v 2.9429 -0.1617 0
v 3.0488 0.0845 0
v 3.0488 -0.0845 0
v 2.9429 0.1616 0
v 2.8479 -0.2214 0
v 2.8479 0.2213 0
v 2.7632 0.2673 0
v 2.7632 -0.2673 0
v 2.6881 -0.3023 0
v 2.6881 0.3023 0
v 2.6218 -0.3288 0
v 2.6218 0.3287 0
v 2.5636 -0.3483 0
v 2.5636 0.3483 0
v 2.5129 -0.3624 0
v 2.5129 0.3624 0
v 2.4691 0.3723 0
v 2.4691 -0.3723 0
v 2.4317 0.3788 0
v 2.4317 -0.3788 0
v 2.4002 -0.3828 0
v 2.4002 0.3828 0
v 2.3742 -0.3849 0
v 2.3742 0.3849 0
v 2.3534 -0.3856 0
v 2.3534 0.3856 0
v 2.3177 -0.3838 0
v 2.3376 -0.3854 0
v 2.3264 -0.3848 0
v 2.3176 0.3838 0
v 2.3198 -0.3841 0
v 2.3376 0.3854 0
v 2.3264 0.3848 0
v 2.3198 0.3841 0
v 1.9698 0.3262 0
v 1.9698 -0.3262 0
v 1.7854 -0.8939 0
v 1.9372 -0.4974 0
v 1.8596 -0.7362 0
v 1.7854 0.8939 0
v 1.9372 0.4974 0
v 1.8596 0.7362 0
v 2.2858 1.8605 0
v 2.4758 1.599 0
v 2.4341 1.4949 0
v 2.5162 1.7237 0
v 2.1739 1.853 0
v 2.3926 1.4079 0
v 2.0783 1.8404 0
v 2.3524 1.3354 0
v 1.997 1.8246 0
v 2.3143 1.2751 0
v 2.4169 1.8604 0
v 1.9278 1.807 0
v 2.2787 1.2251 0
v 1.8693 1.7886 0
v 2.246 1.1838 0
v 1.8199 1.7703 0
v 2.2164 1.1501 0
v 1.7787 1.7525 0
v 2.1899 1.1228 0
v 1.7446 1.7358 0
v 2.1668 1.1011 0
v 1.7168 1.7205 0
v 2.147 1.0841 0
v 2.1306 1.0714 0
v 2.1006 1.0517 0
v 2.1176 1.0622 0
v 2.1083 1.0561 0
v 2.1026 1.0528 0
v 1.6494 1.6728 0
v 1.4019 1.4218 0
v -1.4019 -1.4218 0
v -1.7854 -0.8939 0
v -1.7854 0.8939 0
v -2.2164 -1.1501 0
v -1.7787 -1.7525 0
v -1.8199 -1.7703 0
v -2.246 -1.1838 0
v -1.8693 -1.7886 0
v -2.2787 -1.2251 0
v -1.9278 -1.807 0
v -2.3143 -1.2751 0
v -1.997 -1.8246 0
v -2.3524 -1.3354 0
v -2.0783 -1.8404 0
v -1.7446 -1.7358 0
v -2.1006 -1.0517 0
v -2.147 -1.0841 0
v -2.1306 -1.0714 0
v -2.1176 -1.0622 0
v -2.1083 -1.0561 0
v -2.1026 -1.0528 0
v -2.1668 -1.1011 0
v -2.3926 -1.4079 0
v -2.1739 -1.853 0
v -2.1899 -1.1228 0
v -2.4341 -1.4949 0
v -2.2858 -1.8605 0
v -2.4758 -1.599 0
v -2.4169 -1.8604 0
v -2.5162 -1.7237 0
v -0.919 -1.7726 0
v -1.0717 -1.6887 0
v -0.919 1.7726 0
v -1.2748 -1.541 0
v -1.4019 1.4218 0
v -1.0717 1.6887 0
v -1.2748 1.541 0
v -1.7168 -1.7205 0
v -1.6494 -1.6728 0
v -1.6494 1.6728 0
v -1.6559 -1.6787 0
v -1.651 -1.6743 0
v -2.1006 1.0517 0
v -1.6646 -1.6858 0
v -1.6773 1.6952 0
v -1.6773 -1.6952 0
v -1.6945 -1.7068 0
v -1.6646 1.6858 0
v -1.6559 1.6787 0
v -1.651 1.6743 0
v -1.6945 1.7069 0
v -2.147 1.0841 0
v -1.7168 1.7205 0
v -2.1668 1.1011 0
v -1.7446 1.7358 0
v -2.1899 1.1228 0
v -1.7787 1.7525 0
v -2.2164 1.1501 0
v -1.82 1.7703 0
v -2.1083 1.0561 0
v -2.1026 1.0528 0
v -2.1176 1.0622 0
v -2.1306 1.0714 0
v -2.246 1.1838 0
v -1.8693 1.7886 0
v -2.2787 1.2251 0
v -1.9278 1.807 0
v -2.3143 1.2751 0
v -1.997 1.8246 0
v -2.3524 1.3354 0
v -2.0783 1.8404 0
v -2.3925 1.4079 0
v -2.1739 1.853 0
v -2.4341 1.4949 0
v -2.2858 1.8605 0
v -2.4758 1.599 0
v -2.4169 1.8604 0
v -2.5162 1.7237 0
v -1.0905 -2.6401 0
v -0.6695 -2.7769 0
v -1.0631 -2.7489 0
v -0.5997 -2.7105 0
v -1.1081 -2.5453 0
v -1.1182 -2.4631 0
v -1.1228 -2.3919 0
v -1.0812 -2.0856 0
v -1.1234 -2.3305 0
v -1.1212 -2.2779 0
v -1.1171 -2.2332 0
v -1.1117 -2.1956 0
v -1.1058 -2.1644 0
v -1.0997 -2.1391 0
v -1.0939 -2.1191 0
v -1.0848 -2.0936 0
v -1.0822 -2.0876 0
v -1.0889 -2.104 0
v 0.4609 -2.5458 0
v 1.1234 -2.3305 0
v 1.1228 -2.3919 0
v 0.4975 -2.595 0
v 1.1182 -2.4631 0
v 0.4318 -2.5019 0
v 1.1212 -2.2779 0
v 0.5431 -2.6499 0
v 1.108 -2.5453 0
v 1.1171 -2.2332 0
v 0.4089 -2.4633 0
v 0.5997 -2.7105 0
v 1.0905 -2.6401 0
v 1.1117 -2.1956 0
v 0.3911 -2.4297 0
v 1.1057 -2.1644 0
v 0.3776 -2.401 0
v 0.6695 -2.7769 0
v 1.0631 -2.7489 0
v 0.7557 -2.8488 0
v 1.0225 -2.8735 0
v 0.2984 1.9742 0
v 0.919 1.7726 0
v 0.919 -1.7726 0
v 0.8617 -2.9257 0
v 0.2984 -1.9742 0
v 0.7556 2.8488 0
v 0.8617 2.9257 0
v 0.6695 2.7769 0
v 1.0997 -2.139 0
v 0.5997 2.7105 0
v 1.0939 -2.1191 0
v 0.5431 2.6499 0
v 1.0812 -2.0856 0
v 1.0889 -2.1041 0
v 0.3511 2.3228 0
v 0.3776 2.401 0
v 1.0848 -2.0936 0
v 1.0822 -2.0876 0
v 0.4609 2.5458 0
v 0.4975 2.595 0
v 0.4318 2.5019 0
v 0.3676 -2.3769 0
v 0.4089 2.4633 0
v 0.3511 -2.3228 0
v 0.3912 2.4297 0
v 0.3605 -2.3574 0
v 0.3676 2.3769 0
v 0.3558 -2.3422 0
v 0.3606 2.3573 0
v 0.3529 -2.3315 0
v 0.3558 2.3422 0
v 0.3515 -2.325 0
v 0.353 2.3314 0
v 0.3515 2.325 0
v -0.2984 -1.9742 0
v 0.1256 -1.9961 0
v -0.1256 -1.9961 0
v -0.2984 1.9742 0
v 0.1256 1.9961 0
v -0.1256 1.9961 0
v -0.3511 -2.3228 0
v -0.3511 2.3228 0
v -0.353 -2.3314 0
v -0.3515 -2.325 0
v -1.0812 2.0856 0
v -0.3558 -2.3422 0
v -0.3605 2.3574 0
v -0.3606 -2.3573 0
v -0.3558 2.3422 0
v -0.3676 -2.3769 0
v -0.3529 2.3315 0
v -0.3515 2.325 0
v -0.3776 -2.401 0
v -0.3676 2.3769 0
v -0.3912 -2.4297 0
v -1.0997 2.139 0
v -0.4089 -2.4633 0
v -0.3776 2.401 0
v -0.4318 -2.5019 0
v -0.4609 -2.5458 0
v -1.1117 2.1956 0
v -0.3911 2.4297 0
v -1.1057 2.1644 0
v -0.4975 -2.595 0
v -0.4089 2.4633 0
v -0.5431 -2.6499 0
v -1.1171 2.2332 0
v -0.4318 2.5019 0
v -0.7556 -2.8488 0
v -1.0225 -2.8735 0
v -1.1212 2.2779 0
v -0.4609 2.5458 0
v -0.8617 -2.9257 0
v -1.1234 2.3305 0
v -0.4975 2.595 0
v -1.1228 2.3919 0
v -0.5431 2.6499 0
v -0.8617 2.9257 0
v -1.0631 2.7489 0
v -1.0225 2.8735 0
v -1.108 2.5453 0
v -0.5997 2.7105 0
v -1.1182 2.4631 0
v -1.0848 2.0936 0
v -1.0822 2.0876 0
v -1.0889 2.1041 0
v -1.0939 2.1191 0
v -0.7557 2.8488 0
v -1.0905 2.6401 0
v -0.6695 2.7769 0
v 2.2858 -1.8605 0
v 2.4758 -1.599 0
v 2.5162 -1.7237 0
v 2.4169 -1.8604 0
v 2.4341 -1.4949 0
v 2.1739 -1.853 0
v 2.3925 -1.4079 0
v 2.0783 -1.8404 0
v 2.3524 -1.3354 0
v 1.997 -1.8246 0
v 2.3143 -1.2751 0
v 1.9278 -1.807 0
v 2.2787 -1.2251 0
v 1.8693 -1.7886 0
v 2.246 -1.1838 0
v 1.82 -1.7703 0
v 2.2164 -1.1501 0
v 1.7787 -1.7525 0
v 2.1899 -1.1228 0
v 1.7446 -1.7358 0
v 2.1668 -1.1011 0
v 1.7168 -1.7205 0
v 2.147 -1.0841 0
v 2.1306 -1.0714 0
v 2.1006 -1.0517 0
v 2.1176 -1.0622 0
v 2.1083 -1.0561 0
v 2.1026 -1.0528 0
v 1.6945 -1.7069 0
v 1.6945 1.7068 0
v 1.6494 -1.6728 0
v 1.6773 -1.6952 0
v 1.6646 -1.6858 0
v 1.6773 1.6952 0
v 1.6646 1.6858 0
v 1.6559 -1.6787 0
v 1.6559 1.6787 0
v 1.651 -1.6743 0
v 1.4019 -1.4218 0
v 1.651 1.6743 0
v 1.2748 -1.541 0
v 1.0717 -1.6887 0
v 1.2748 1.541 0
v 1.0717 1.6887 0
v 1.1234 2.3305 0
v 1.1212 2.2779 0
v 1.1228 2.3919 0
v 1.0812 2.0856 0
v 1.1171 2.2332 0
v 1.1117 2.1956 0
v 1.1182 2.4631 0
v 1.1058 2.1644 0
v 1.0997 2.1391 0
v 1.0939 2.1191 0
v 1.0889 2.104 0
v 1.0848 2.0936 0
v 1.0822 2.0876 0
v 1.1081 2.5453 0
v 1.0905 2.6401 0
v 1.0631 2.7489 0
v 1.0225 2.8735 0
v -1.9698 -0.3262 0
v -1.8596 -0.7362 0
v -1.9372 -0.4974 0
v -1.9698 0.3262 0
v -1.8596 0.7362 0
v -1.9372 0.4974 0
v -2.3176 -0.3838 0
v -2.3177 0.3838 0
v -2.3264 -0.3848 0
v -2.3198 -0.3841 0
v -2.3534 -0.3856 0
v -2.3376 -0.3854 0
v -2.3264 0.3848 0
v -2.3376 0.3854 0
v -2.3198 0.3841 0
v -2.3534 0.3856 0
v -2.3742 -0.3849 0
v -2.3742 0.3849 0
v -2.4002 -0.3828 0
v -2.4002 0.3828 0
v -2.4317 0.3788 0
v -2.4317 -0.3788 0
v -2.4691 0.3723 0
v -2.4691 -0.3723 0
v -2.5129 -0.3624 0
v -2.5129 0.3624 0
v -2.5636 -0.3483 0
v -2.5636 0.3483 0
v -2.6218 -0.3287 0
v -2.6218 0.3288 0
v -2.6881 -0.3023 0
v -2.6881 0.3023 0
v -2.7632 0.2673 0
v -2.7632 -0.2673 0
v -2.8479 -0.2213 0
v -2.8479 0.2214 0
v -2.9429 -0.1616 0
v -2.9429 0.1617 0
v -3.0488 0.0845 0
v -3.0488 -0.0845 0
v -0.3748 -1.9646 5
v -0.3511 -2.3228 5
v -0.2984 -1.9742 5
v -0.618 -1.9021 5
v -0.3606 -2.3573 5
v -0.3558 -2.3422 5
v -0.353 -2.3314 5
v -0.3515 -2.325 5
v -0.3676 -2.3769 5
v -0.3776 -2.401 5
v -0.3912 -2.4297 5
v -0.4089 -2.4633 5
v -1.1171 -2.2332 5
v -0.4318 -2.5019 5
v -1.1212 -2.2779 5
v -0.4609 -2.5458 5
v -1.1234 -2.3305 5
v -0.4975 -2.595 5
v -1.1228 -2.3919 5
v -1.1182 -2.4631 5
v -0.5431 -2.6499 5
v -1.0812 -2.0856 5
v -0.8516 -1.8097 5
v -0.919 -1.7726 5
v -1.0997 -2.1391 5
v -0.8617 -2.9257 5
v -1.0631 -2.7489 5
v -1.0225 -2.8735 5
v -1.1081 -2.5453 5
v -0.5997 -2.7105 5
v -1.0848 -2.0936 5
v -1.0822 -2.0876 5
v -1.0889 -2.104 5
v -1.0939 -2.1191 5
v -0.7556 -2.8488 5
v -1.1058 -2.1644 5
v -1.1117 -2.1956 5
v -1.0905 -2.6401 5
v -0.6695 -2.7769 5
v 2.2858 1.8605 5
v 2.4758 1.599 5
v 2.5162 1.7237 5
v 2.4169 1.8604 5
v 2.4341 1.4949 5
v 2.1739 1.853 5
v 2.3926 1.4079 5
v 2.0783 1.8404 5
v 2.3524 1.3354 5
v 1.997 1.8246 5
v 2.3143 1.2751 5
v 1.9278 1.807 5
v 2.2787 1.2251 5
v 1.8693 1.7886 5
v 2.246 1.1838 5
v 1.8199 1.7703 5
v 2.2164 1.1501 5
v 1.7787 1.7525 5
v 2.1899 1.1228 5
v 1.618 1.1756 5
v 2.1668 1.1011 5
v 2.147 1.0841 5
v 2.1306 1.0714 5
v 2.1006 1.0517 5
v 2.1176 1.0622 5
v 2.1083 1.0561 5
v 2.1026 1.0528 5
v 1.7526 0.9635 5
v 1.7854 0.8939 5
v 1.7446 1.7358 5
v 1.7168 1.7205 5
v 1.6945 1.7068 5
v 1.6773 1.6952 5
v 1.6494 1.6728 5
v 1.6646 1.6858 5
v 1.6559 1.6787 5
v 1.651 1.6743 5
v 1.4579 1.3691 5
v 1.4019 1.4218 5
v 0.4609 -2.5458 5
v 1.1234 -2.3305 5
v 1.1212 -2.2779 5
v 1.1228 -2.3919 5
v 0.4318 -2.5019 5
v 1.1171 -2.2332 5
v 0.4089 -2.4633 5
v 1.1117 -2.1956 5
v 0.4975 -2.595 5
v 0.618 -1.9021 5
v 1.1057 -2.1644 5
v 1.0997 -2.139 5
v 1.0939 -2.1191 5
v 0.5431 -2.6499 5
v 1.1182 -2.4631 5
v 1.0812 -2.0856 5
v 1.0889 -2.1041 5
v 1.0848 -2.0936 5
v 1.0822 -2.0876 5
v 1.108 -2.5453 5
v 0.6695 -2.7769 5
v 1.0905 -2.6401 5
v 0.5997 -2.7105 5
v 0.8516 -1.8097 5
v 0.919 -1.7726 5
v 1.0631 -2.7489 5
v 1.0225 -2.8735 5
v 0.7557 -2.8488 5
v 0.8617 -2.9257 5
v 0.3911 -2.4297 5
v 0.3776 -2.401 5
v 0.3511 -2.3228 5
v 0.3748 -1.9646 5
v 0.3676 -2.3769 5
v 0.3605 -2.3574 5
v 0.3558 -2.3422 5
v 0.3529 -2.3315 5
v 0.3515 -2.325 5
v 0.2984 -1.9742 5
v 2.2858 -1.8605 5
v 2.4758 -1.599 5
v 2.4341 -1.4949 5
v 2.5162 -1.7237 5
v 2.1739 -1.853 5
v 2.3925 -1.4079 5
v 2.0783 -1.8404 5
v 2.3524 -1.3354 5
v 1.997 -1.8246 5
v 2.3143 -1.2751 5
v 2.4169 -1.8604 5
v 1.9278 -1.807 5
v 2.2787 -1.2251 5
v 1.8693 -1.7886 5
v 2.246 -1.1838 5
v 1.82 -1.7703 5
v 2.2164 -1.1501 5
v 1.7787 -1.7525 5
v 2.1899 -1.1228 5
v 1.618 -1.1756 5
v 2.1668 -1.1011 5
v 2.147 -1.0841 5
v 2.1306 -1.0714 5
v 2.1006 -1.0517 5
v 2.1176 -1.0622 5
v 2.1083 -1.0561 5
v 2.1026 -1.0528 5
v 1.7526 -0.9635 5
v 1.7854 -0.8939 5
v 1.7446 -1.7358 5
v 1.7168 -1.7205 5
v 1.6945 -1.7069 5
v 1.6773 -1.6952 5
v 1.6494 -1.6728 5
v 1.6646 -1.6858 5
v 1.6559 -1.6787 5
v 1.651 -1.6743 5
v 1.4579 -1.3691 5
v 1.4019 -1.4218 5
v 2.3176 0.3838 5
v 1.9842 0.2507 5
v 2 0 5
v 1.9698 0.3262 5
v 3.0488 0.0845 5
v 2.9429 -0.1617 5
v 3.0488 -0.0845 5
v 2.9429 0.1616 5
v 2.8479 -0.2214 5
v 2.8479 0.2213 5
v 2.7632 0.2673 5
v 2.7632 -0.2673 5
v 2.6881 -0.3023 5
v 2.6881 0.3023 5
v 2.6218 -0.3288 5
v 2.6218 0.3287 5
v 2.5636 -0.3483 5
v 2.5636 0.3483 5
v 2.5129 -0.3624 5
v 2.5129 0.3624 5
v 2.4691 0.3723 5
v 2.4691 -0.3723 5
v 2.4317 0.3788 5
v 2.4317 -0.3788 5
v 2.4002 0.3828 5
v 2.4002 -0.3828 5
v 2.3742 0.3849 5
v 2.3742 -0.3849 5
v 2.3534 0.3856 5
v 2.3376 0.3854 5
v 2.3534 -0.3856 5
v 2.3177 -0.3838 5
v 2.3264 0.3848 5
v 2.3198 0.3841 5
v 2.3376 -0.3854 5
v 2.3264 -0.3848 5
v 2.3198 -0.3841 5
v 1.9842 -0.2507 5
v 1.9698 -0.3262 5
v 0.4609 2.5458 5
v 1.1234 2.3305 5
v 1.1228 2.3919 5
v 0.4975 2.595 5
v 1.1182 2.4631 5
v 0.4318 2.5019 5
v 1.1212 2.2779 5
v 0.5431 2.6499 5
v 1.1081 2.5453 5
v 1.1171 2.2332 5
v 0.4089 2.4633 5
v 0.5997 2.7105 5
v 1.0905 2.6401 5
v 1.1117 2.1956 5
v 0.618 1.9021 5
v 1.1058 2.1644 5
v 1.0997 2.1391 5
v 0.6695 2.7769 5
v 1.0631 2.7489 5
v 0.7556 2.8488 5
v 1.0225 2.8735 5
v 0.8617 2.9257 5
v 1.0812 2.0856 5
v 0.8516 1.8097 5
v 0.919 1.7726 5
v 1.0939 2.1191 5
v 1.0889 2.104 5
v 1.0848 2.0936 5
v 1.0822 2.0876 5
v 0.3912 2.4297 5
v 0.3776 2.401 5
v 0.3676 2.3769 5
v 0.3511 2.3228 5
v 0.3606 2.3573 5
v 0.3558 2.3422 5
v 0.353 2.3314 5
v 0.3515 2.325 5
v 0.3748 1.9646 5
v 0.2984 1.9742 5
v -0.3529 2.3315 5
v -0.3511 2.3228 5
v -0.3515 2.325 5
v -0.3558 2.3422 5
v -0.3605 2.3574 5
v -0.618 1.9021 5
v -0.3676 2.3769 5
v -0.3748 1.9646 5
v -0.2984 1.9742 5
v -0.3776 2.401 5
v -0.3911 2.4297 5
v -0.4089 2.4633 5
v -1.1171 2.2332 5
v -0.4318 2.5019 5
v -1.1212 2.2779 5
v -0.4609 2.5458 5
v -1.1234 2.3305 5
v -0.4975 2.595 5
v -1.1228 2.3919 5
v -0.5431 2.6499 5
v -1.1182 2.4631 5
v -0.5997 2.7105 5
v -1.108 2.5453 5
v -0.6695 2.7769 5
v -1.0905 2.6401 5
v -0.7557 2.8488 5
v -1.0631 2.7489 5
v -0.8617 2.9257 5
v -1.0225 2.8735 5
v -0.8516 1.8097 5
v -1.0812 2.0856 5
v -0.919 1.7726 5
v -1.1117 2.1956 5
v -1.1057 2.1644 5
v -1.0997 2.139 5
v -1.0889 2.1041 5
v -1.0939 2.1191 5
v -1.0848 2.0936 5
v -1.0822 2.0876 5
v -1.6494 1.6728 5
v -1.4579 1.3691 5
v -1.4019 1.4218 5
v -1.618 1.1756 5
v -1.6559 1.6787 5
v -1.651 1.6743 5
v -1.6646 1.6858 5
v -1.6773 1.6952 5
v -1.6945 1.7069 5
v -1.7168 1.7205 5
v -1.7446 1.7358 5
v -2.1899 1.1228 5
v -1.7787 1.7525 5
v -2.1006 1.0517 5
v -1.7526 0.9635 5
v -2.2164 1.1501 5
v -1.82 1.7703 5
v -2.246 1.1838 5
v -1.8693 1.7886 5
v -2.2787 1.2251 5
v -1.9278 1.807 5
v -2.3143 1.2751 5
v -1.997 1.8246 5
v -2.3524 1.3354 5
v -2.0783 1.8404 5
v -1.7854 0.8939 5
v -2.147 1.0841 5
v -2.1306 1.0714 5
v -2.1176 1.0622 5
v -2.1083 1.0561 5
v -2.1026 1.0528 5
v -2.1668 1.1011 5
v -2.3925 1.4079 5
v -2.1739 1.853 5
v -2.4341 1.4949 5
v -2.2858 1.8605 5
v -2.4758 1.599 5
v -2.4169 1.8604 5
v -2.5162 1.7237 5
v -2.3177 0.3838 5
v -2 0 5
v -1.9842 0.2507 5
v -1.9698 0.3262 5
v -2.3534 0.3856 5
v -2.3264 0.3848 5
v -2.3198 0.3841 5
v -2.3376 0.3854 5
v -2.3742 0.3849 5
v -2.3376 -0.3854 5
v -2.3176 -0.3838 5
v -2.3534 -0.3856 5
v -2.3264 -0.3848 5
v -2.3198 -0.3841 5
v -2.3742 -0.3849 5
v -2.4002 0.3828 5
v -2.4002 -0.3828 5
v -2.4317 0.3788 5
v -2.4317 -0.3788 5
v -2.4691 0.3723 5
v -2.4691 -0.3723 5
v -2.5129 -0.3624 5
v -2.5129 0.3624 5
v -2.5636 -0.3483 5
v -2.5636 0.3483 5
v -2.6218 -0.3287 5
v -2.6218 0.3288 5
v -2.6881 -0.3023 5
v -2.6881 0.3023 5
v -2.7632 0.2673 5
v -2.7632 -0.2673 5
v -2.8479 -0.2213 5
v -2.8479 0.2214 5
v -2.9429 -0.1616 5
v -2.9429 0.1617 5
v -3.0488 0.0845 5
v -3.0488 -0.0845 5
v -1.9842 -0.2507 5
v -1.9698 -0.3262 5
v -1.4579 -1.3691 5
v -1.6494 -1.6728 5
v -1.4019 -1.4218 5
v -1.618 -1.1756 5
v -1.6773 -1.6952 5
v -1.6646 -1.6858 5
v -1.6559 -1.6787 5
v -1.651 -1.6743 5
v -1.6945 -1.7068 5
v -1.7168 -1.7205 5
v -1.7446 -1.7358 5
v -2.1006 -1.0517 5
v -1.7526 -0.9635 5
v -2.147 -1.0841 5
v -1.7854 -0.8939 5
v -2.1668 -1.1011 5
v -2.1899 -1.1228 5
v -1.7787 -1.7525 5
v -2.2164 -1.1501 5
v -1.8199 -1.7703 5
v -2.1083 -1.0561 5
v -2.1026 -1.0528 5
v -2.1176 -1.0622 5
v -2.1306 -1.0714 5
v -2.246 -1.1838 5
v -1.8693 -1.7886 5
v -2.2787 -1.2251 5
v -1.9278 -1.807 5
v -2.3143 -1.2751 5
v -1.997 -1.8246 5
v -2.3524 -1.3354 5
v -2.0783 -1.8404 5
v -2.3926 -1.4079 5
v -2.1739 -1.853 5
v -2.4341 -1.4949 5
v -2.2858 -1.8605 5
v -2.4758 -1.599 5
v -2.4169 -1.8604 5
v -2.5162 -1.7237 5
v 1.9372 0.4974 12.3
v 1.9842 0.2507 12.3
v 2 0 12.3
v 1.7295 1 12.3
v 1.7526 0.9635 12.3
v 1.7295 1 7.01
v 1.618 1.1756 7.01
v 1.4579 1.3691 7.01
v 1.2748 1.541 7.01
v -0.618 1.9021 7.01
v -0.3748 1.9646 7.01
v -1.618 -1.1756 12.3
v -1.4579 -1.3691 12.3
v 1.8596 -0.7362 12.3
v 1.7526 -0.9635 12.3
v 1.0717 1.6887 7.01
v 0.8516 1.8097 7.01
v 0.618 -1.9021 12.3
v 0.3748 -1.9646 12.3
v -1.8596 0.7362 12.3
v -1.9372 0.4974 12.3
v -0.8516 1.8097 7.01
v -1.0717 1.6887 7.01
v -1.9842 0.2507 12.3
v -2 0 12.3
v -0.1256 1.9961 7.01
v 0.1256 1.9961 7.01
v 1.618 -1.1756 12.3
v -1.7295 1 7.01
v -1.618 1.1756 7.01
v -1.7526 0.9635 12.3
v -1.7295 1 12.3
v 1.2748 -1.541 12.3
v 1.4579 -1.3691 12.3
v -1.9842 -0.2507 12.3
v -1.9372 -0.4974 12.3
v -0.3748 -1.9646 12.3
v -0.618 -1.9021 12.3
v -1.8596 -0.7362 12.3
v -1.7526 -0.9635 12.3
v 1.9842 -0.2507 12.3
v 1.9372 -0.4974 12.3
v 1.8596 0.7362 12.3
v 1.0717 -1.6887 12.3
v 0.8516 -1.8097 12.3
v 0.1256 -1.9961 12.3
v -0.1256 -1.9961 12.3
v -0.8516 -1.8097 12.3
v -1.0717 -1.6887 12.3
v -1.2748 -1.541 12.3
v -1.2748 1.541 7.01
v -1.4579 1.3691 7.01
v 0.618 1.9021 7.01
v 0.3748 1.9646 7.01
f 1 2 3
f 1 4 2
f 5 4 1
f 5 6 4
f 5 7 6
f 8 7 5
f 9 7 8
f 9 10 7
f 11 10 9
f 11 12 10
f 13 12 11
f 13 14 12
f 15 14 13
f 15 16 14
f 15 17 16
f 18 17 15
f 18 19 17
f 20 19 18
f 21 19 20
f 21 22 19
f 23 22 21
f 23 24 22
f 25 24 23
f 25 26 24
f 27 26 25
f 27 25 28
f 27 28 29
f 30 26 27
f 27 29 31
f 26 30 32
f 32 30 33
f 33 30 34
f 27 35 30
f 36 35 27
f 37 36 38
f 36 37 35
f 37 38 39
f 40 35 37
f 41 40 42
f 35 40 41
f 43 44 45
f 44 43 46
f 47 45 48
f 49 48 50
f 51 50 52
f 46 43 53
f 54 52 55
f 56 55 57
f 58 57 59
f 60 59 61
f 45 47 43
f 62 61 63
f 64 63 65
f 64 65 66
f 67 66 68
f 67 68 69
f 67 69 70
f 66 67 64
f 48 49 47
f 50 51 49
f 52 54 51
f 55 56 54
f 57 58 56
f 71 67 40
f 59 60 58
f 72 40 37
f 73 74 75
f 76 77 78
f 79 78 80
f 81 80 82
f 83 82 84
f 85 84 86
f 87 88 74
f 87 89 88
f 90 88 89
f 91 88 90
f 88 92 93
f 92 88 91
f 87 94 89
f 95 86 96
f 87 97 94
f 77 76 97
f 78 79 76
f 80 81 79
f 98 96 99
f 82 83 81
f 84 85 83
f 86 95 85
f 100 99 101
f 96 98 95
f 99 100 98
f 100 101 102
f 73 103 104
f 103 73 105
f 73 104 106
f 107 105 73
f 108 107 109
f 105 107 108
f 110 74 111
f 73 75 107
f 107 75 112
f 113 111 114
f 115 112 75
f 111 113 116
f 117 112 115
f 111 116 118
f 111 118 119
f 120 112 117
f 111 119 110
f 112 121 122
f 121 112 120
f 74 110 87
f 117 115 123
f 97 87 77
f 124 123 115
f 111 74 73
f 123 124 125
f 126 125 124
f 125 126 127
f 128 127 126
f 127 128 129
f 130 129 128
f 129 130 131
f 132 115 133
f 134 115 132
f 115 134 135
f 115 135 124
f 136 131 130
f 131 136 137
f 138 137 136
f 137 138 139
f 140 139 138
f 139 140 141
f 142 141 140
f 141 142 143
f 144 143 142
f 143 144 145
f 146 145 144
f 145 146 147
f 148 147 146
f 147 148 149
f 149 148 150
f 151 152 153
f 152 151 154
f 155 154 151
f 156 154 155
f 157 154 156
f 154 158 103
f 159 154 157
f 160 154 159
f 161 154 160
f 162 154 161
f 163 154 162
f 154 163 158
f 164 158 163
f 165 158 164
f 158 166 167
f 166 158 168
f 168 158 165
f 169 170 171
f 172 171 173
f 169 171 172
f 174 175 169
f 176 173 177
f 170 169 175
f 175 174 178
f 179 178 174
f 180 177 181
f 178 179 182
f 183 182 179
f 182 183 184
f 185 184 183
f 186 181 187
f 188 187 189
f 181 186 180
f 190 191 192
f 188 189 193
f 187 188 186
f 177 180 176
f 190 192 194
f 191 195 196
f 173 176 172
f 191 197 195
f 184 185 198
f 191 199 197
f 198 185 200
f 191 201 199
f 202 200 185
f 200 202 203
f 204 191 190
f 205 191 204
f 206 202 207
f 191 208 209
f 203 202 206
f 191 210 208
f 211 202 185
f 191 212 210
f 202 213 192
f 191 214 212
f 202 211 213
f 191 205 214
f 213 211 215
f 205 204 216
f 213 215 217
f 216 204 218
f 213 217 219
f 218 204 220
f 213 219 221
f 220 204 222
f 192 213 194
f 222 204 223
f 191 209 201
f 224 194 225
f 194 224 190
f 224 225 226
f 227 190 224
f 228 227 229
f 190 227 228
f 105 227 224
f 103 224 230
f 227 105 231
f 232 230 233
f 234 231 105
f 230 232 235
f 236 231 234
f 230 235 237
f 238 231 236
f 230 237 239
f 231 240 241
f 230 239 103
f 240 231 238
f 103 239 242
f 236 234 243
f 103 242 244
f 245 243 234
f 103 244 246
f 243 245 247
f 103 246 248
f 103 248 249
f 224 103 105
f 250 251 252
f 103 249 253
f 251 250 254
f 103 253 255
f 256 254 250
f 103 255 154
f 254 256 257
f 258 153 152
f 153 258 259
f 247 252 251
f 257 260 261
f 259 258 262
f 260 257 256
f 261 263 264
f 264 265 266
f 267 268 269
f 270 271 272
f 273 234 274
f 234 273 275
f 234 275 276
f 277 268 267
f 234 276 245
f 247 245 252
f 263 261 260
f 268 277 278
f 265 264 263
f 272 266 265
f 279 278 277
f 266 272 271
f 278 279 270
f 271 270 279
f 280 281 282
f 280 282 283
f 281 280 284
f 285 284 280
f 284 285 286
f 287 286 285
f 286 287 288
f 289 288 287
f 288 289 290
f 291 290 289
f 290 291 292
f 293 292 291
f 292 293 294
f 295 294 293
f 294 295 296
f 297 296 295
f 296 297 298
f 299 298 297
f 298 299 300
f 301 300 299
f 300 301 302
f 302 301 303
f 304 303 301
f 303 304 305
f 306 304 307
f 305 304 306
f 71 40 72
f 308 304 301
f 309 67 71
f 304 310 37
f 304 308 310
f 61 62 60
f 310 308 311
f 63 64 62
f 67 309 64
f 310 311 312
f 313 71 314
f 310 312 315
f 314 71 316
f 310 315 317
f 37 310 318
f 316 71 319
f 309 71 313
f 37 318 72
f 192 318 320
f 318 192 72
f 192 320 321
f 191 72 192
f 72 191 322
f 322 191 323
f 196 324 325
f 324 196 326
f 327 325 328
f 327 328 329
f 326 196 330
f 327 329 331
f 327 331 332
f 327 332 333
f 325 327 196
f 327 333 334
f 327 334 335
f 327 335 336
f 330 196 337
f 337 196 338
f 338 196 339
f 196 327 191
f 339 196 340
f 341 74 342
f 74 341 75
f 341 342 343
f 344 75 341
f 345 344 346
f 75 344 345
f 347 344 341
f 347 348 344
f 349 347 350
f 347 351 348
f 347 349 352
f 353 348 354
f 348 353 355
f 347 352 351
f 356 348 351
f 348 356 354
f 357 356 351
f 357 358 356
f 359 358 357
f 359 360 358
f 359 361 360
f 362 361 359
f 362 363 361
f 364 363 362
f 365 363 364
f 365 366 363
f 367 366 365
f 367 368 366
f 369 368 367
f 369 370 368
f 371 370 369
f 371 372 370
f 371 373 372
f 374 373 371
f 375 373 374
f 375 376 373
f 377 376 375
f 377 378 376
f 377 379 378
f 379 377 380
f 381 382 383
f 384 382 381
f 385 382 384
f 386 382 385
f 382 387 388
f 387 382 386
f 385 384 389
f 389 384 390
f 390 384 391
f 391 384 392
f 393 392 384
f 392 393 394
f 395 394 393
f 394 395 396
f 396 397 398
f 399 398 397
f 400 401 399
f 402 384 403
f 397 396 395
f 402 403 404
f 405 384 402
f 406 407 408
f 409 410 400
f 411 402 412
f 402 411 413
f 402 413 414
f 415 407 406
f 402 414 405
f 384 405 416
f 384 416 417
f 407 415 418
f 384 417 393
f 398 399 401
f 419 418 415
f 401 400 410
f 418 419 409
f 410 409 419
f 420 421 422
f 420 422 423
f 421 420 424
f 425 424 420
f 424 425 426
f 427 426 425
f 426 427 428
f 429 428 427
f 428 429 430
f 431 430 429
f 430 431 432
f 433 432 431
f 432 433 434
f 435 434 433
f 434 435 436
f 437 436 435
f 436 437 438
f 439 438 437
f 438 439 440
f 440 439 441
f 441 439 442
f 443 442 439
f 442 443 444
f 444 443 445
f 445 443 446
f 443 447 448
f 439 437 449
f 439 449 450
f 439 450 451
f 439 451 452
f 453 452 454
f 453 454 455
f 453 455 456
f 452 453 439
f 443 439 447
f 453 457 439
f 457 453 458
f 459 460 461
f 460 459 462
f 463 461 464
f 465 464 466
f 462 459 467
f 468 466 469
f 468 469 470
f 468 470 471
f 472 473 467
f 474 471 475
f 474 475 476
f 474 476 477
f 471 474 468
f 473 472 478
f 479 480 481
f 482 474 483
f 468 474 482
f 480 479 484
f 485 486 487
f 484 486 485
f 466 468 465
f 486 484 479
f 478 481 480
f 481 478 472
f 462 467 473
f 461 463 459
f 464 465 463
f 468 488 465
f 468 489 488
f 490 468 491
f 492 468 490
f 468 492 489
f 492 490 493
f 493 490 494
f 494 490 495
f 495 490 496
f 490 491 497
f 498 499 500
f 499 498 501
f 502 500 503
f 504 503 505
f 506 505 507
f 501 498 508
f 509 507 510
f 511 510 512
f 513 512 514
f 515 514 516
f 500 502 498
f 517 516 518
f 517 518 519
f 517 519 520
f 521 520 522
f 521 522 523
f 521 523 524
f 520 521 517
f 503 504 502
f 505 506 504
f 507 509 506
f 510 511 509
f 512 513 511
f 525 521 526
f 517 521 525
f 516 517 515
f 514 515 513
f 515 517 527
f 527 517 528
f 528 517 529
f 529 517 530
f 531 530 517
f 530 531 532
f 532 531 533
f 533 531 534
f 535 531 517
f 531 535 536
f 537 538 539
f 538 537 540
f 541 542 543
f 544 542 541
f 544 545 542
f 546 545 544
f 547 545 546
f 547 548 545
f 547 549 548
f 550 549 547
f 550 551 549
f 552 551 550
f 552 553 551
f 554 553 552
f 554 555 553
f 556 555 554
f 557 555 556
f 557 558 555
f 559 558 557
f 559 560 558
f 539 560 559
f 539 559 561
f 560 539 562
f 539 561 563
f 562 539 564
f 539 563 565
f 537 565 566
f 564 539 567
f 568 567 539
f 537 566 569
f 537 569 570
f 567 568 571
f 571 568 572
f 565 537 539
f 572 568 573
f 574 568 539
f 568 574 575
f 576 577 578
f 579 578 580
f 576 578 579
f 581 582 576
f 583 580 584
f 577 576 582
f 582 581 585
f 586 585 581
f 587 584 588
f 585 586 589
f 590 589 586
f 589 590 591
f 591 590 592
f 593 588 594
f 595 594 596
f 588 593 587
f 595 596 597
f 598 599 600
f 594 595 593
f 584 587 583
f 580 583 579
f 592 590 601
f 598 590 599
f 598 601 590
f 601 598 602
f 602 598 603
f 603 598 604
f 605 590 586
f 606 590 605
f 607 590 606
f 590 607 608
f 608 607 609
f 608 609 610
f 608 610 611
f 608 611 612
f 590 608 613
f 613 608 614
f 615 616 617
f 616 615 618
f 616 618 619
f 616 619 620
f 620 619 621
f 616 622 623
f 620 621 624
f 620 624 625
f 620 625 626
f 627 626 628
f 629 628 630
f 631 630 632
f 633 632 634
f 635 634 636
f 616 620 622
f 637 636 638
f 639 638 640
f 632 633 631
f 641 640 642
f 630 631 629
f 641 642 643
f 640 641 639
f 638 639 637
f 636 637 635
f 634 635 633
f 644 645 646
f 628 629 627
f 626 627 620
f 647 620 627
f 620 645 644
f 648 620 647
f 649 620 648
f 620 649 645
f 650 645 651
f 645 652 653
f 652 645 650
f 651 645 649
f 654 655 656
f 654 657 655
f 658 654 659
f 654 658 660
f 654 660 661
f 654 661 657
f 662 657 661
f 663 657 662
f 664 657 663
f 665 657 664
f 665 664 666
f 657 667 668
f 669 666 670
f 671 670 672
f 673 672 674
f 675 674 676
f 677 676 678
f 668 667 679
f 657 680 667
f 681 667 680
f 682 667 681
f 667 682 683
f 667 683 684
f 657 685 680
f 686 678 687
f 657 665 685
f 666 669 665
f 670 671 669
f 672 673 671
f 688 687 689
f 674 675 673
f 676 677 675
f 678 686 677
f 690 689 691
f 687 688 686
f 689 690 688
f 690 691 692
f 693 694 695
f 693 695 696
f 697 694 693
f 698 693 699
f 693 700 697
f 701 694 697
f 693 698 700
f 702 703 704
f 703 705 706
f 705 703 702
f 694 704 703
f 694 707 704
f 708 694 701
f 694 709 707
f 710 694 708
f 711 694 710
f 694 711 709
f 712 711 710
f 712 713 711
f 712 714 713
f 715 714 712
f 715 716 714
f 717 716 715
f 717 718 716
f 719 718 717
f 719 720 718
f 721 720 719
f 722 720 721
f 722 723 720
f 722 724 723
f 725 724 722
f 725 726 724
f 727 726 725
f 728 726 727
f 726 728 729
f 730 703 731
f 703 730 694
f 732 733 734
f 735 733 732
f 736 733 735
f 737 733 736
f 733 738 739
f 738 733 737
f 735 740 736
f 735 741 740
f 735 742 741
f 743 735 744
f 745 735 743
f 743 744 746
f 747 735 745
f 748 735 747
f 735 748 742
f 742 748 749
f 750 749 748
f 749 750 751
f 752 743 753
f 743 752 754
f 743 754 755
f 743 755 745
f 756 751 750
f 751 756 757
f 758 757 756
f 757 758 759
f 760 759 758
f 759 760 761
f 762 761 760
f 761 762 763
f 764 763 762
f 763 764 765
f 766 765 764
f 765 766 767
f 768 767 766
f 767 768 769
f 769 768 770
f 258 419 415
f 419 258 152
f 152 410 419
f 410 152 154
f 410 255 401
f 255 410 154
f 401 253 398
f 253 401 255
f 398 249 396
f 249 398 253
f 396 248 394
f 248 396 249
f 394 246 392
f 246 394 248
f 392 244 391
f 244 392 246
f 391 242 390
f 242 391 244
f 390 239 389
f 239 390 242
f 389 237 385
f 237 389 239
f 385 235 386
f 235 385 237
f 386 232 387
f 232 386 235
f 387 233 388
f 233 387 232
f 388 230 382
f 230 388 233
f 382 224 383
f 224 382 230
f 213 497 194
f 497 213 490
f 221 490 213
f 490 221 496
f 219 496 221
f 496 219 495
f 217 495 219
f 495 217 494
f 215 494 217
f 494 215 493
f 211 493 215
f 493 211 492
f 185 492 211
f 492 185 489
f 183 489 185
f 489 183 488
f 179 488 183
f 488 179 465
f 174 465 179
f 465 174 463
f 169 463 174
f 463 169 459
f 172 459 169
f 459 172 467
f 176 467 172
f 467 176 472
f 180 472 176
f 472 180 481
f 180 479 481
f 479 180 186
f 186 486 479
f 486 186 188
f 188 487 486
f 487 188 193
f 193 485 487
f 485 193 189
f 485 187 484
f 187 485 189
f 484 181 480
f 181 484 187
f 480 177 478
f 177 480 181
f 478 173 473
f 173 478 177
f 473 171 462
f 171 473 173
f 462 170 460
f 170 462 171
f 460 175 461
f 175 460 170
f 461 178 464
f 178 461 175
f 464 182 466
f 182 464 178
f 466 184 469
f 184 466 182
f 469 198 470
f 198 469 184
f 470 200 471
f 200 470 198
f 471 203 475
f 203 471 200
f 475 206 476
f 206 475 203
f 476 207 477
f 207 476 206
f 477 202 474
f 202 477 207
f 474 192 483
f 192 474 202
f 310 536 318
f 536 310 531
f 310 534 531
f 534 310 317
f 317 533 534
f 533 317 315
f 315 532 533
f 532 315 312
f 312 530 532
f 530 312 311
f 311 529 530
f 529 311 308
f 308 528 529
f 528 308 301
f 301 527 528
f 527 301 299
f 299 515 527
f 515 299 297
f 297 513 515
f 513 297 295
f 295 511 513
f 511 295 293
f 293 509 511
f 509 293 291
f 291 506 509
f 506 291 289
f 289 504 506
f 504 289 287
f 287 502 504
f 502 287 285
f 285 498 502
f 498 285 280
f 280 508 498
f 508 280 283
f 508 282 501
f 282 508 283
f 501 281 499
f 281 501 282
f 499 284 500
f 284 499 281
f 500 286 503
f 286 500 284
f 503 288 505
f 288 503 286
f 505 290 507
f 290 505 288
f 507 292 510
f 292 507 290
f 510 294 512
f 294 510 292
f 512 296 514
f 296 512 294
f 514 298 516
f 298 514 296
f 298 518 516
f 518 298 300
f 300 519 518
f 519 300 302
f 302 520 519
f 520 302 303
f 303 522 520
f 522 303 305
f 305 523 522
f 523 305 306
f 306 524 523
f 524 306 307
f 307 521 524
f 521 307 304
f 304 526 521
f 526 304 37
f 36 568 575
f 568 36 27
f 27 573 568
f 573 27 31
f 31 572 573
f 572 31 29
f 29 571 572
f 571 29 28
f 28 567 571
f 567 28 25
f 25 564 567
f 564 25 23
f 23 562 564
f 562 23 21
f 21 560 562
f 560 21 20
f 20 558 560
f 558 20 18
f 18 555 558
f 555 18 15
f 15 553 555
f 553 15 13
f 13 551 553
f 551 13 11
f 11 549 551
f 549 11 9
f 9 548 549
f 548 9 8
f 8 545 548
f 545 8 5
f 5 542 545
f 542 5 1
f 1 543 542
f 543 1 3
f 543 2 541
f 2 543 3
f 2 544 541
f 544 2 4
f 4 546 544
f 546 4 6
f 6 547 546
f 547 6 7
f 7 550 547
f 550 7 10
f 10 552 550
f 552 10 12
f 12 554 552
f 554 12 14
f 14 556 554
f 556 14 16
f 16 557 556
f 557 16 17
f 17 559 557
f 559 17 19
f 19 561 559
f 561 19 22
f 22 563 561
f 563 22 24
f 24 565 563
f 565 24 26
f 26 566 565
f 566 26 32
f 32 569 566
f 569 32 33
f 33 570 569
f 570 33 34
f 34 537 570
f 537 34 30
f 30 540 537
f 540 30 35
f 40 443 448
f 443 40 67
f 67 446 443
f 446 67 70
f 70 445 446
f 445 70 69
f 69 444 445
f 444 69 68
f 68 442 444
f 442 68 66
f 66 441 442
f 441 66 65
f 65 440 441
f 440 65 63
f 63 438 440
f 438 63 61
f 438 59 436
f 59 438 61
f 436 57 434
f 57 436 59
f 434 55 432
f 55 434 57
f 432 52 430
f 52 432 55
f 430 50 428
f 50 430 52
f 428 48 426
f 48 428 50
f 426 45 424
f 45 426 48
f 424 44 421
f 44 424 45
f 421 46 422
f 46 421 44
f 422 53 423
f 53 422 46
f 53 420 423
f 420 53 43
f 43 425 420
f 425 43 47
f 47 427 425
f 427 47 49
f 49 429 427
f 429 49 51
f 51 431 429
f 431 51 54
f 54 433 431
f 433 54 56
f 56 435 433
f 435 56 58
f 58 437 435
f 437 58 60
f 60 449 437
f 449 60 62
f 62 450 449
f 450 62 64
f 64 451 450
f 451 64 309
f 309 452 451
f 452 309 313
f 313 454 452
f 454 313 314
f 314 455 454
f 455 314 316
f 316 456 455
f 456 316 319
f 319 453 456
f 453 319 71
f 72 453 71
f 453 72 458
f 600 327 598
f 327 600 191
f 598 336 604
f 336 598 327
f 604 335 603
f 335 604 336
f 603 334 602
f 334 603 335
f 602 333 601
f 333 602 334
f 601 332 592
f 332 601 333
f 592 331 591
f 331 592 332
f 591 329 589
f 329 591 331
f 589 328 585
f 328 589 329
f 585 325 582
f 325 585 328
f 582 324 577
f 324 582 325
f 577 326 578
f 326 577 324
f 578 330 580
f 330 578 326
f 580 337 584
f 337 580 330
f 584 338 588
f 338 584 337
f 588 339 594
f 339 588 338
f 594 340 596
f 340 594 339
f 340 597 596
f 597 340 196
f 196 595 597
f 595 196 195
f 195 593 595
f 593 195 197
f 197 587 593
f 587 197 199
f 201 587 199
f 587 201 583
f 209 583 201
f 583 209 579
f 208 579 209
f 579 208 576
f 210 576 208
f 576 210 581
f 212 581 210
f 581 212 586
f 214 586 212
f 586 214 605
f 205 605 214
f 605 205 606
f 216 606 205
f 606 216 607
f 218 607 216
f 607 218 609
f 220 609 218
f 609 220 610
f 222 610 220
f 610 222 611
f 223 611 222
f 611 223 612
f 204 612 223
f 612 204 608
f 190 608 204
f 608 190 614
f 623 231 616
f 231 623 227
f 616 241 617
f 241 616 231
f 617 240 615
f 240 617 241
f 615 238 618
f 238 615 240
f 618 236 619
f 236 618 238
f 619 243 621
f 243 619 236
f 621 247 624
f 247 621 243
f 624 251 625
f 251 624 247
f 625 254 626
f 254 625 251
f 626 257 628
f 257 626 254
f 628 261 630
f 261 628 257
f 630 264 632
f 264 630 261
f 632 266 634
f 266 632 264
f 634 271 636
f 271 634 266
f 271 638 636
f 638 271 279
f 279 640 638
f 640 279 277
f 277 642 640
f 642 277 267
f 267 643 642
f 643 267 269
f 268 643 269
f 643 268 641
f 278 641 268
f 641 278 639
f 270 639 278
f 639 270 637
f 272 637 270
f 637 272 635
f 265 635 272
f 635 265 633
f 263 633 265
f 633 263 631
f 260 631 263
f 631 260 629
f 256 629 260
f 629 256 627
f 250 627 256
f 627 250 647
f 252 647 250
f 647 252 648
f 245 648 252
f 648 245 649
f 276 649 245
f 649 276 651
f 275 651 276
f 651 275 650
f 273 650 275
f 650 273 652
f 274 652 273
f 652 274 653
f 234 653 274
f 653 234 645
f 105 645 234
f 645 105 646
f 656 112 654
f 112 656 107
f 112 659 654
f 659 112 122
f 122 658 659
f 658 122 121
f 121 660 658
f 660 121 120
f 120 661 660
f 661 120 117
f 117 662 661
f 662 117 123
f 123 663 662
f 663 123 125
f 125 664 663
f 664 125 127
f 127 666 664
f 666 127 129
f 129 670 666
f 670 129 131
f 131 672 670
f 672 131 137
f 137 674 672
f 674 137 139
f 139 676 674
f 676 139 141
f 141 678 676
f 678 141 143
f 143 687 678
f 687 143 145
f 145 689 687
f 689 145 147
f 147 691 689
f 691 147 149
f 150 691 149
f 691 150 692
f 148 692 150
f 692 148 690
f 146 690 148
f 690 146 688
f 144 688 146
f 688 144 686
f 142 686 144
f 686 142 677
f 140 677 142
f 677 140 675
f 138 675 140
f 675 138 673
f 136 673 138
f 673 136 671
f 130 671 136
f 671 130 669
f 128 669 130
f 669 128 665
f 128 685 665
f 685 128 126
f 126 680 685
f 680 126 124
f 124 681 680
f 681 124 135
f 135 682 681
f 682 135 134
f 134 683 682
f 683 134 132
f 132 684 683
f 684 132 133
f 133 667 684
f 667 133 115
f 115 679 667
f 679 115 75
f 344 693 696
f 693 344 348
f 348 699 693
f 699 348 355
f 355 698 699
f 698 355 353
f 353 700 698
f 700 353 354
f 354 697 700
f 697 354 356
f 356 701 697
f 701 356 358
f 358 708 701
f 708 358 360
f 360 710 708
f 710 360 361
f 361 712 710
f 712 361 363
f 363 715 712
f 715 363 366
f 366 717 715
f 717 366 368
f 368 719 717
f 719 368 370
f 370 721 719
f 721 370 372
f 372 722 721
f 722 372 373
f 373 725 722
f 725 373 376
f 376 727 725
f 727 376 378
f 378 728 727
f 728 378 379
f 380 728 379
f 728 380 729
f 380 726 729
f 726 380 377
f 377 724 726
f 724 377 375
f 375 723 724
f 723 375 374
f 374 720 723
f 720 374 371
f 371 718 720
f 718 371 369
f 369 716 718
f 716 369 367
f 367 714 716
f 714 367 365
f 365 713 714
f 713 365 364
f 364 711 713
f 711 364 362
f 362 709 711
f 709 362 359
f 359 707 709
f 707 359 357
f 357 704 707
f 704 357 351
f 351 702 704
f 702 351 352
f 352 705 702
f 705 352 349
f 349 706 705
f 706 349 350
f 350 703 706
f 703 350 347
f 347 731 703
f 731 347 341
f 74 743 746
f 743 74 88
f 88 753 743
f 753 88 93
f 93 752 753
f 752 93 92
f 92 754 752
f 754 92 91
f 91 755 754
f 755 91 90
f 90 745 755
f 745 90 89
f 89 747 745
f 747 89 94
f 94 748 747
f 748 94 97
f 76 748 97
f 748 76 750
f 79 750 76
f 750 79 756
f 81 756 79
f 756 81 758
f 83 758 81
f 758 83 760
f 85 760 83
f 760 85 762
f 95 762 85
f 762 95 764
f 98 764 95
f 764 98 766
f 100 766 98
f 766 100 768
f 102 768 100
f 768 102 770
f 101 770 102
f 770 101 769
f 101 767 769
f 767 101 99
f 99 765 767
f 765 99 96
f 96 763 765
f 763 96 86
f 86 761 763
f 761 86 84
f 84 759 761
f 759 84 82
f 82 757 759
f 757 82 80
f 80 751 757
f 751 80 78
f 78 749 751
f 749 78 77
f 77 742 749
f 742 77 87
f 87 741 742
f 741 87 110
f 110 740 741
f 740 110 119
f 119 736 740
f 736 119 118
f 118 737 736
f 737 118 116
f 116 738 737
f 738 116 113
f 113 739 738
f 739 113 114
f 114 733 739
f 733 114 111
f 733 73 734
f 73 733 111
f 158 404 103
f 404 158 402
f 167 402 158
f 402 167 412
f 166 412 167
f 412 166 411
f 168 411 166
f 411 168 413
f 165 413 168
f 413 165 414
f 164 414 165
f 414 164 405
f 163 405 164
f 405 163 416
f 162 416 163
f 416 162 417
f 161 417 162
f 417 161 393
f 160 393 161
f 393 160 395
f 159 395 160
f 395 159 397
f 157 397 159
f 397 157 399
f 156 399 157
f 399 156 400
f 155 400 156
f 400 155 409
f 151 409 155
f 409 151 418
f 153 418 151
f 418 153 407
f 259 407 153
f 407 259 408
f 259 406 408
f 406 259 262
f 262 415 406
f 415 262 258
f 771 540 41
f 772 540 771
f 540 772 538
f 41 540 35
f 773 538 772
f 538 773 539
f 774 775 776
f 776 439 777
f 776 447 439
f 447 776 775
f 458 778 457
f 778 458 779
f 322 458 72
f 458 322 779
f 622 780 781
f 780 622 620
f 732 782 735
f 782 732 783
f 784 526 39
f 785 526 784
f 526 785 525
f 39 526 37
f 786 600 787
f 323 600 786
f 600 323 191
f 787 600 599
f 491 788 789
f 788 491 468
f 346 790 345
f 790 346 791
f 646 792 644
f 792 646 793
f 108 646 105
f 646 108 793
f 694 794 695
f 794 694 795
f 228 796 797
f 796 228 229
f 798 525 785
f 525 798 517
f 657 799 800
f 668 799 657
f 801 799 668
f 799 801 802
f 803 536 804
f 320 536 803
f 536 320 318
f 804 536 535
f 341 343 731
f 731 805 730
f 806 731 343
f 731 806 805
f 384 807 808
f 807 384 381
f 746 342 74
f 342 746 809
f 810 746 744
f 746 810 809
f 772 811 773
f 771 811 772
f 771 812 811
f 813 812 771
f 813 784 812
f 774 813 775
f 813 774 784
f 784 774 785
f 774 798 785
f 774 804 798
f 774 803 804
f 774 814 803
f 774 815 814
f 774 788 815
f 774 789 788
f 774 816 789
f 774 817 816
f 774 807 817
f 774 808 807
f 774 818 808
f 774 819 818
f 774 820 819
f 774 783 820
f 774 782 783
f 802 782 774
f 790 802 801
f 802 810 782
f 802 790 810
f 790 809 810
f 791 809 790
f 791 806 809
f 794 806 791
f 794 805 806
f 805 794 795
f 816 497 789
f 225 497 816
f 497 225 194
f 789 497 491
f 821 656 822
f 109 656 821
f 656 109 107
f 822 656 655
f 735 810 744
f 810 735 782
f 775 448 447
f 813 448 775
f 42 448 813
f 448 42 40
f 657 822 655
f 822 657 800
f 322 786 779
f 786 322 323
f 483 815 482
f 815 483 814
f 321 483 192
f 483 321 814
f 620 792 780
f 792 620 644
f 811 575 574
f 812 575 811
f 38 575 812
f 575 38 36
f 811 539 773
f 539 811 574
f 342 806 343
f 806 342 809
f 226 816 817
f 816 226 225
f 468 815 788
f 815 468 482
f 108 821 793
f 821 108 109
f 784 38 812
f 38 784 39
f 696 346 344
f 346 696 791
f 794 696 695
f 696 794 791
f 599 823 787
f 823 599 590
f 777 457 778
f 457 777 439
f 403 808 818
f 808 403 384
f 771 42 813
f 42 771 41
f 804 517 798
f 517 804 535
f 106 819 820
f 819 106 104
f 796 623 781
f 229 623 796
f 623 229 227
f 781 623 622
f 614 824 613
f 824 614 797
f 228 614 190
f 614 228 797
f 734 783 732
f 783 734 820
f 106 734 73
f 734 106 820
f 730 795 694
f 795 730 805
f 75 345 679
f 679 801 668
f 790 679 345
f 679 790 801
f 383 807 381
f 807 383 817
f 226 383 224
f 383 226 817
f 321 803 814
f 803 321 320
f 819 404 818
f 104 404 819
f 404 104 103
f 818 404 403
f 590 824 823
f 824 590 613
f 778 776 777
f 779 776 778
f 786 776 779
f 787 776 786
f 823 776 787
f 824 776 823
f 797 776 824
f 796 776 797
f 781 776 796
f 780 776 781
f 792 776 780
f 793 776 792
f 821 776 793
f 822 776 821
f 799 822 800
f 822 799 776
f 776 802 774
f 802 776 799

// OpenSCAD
include <../vendor/gear.scad>

module gear2() {
    spur_gear (modul=0.5, tooth_number=10, width=5, bore=0, helix_angle=0, optimized=true);
    
    difference() {
        cylinder(h=12.3,r=2);
        
        // flat for gear1's key; runs past the end of the shaft (12.3) so the tip isn't left round
        translate([-2.5,1,7.01])
        cube([5,3,6]);
    }
}
gear2();
